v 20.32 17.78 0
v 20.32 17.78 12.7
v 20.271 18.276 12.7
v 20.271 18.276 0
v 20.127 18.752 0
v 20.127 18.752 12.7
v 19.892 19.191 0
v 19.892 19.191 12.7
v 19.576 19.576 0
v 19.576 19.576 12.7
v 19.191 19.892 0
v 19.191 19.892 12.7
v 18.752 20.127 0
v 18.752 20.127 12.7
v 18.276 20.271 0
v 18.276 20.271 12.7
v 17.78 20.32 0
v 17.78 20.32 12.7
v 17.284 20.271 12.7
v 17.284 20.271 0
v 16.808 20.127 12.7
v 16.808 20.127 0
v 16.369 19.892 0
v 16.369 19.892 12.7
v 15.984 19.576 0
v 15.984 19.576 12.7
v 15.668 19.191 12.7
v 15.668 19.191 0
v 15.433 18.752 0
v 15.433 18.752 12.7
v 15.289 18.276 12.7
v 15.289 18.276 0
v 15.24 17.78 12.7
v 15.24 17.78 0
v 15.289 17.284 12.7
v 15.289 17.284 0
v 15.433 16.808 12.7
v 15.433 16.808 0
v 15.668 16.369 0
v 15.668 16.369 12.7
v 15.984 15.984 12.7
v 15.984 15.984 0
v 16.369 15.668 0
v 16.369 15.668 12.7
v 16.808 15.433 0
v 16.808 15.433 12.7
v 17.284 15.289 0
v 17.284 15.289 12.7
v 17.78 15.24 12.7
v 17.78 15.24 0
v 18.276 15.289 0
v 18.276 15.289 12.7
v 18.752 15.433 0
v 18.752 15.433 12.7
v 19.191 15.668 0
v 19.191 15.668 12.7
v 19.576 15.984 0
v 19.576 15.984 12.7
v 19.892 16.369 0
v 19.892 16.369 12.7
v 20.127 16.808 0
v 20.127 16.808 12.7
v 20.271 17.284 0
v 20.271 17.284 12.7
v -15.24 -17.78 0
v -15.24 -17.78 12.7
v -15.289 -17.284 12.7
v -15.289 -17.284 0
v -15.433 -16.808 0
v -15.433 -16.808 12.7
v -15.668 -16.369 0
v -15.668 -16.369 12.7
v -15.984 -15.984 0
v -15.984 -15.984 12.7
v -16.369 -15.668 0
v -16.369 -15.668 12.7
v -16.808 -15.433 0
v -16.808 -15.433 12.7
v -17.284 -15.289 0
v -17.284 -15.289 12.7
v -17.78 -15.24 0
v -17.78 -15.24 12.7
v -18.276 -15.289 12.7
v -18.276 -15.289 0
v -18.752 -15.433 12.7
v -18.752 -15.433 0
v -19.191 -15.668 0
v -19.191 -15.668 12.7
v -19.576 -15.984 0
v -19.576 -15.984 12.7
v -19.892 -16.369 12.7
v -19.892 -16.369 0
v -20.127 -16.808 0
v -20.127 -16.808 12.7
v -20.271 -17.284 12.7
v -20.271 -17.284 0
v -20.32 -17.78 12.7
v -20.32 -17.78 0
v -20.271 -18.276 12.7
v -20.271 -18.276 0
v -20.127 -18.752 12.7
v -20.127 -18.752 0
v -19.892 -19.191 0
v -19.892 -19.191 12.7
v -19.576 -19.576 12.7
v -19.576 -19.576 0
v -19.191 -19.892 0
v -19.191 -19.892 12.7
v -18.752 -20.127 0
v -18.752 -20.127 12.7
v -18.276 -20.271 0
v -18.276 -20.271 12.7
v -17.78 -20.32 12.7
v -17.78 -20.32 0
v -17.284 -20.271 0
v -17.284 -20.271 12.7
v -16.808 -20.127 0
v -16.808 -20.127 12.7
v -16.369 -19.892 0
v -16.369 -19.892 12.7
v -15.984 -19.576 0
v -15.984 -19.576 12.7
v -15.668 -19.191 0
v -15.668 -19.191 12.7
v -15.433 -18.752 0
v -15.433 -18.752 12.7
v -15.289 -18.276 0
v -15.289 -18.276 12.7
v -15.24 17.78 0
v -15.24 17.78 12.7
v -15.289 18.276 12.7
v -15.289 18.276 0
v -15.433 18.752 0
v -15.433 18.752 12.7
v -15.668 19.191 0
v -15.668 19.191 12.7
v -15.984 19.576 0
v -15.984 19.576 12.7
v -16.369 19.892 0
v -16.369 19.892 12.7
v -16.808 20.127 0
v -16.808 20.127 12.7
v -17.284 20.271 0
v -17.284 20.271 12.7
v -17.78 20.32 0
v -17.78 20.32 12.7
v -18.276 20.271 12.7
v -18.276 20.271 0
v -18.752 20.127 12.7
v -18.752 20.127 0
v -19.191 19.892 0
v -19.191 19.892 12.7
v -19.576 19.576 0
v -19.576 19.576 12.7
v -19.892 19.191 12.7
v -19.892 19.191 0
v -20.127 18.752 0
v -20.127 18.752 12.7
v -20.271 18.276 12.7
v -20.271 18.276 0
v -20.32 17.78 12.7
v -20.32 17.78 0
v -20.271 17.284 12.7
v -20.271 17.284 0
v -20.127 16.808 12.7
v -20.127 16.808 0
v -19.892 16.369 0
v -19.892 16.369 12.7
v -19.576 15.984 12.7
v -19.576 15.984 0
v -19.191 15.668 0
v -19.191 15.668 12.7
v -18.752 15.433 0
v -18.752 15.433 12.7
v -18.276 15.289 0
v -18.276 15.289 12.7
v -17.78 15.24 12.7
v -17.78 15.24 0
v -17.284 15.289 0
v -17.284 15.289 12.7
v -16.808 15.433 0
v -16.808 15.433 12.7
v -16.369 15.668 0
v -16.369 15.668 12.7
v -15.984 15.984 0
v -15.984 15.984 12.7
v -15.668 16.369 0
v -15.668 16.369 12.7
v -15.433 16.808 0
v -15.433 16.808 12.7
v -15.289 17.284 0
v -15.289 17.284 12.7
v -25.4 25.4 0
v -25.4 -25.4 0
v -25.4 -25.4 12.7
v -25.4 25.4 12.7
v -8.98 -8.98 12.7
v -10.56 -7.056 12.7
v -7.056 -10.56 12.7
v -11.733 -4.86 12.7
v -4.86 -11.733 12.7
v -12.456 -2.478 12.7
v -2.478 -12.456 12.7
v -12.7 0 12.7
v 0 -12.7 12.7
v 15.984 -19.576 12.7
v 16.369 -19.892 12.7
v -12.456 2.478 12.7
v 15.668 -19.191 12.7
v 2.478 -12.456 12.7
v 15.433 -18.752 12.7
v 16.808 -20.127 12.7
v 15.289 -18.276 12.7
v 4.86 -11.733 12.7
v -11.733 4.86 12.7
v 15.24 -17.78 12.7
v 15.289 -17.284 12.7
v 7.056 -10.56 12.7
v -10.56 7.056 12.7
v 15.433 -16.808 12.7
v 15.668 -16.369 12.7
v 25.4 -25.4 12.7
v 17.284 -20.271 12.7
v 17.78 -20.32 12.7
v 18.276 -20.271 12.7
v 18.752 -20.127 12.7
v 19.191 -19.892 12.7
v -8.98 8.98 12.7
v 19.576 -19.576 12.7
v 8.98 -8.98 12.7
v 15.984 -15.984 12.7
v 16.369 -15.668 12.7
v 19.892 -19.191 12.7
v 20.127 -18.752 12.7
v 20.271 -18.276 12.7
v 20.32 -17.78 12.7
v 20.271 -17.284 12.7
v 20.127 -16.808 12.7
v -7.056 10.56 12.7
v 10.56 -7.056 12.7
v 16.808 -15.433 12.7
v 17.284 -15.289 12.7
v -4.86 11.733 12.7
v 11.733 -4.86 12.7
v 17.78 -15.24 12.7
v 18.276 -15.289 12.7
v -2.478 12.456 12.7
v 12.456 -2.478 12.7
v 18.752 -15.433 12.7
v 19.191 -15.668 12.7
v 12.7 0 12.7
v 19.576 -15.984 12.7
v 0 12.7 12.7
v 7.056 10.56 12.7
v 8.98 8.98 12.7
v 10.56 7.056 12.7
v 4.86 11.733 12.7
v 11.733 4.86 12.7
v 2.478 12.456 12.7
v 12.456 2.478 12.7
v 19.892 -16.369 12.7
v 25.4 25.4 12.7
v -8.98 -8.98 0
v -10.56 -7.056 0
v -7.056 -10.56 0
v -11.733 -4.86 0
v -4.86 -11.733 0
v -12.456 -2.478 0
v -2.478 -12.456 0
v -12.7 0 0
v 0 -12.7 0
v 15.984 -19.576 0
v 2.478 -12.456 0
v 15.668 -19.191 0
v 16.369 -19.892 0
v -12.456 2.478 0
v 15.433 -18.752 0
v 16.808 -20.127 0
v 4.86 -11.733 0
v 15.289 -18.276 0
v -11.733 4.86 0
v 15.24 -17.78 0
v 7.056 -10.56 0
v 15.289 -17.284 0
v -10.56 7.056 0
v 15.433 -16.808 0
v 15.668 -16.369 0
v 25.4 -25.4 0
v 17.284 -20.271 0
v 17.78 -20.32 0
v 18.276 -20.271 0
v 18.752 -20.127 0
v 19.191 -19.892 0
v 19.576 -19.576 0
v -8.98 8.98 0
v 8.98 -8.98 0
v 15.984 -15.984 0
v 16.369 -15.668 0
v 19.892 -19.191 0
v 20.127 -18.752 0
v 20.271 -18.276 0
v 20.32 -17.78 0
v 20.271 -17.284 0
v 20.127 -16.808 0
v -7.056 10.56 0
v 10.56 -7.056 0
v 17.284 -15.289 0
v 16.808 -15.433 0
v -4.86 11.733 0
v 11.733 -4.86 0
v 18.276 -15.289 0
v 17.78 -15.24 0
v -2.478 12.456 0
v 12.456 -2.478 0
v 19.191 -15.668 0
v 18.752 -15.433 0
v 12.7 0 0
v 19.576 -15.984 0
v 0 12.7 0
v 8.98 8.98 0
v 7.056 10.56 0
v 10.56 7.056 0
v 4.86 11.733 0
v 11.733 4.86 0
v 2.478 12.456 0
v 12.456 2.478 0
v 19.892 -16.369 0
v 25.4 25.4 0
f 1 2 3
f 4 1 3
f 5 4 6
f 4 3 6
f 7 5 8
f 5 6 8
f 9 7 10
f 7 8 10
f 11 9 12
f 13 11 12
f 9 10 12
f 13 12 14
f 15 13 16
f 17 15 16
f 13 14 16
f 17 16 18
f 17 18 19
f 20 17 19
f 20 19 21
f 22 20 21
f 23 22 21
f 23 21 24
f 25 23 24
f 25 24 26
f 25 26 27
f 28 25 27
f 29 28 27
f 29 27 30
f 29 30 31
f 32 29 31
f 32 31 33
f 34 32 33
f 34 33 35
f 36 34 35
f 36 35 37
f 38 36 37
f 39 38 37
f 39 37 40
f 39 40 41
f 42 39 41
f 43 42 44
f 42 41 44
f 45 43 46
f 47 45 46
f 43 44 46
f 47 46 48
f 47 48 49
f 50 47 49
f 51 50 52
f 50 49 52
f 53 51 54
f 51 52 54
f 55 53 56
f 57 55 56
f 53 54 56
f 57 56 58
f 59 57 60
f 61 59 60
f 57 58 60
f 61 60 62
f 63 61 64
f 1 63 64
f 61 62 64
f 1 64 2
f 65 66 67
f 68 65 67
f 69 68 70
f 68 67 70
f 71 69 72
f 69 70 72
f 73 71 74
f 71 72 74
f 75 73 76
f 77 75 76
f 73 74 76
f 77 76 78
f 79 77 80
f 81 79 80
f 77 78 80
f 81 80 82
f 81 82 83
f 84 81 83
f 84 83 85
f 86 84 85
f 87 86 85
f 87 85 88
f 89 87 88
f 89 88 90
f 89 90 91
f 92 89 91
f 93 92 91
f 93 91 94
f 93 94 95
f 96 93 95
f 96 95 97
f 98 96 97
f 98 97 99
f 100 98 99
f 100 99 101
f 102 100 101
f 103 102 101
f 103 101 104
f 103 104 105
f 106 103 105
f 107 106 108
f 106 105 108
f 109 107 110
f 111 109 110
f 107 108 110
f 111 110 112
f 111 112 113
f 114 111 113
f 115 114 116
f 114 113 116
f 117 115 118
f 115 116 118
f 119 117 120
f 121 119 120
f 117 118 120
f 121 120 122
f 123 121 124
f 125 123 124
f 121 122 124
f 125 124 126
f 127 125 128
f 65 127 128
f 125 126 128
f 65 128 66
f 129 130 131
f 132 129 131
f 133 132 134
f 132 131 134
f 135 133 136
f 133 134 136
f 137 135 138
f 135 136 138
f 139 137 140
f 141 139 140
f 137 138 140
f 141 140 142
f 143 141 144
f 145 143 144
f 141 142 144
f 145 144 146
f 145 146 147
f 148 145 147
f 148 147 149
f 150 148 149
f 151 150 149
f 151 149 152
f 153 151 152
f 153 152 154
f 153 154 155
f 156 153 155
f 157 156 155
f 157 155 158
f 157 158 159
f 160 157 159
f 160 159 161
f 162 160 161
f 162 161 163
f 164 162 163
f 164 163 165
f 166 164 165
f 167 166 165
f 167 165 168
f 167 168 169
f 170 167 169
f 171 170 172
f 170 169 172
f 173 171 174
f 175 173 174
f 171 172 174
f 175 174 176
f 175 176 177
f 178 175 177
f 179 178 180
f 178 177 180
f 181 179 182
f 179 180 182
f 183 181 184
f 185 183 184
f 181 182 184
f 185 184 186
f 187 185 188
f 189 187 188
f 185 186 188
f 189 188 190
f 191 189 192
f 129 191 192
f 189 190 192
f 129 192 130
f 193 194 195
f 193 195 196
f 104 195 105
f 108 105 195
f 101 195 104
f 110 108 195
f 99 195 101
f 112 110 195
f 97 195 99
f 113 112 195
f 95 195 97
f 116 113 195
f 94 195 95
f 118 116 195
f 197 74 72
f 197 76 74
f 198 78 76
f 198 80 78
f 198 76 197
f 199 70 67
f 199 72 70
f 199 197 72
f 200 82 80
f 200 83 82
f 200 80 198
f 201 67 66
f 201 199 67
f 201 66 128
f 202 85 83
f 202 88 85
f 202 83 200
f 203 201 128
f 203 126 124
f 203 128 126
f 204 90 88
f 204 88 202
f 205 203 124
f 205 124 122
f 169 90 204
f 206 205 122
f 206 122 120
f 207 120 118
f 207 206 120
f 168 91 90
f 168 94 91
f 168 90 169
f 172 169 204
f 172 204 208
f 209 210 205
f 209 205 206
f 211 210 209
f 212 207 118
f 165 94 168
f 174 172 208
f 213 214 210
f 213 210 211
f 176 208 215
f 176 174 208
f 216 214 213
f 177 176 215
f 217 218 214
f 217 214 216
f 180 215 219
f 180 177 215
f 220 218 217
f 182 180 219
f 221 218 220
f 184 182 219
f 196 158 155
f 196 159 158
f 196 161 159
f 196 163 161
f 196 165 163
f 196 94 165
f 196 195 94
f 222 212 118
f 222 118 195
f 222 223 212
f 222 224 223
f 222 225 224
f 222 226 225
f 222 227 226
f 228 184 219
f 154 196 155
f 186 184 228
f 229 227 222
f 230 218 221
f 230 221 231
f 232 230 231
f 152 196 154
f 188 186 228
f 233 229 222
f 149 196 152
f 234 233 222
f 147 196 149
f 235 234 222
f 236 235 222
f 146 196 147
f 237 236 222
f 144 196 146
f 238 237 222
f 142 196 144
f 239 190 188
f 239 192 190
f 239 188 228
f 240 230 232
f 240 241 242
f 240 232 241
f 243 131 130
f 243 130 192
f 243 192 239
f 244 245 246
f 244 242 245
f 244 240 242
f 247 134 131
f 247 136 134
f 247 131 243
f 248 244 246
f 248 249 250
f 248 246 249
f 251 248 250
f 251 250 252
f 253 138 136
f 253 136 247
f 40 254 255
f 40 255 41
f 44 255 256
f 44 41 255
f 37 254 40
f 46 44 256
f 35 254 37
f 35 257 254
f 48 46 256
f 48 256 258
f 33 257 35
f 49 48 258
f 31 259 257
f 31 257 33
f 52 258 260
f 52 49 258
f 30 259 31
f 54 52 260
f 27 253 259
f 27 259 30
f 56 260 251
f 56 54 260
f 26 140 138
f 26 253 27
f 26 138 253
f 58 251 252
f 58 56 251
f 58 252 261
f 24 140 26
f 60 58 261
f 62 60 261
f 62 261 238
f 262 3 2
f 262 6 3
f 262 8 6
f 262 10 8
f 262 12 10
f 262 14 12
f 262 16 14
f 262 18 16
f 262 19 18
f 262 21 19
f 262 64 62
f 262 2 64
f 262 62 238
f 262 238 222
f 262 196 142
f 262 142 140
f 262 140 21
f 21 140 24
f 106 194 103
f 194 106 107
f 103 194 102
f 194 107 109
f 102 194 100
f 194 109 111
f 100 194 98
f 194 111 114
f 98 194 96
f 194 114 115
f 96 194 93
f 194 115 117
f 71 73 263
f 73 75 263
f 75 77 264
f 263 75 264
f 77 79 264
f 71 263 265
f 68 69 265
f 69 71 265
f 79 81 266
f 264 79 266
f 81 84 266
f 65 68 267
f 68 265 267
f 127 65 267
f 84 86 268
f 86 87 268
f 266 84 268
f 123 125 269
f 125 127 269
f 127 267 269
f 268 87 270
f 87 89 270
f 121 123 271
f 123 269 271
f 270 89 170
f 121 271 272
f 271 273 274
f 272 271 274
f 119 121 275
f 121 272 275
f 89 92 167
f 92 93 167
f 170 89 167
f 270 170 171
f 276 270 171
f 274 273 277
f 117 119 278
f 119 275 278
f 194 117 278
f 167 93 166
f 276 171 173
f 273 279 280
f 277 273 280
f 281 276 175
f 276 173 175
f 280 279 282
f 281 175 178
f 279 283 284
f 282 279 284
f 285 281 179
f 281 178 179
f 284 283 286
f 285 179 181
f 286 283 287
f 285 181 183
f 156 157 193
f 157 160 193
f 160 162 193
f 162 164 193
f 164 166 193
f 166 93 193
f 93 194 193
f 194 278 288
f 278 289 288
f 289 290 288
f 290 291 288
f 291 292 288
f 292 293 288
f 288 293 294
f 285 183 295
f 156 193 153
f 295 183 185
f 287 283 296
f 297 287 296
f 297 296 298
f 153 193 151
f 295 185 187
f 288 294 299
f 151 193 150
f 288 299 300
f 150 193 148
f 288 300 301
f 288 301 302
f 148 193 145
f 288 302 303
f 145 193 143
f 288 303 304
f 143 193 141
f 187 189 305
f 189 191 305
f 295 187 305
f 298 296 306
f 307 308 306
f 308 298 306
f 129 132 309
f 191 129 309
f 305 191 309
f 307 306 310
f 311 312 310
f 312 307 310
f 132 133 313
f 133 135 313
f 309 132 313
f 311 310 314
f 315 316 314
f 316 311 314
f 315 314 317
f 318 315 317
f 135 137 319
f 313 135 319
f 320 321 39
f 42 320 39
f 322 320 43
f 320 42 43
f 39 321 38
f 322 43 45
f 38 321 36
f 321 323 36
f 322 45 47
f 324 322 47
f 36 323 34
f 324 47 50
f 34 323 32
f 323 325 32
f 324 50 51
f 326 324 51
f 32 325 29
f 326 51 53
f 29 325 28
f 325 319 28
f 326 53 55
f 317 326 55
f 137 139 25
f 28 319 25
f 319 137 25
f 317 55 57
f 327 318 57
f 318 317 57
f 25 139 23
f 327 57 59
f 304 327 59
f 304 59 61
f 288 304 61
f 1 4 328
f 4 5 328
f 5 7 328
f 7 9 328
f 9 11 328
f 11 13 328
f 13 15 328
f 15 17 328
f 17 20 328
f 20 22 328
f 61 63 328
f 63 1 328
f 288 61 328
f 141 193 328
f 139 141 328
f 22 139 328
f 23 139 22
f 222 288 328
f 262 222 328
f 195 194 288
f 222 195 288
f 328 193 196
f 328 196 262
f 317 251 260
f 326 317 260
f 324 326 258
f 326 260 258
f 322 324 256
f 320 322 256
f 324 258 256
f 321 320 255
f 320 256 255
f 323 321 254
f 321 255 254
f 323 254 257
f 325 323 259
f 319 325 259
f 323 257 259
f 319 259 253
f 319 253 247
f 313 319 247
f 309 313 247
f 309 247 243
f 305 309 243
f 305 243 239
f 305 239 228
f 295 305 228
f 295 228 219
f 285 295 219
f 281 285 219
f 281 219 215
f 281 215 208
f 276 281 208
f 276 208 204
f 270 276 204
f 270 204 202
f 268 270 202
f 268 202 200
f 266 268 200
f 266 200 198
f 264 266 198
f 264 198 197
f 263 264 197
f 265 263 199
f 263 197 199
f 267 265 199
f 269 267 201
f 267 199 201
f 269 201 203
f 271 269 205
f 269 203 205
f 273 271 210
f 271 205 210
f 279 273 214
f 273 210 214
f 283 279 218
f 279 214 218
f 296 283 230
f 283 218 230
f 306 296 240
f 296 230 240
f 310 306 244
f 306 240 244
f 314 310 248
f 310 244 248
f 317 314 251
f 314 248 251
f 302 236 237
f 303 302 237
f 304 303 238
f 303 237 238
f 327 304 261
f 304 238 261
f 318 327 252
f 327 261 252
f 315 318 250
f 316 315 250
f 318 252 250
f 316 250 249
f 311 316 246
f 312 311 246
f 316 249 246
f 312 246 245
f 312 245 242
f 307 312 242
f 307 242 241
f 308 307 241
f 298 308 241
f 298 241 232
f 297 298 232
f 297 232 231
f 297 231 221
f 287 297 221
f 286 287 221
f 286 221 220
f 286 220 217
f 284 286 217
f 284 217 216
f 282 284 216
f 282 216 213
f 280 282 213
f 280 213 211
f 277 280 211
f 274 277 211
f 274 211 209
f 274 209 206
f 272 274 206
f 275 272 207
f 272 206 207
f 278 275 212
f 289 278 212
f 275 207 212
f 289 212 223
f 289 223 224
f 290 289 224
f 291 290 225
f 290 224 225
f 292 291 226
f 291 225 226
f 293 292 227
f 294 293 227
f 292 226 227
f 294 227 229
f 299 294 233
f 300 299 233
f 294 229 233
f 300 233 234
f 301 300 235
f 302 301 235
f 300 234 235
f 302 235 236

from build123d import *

# Parameters (mm, degrees)
F0_W     = 50.8
F0_H     = 50.8
F1_DEPTH = 12.7
F2_R     = 2.54
F2_R_2   = 12.7
F3_DEPTH = 25.146


with BuildPart() as f1:
    # F0 (on Top) → F1 (new body)
    with BuildSketch(Plane.XY):
        Rectangle(F0_W, F0_H)
    extrude(amount=F1_DEPTH)

    # F2 (on face) → F3 (cut)
    with BuildSketch(Plane.XY.offset(12.7)):
        with Locations((17.78, 17.78)):
            Circle(F2_R)
        with Locations((17.78, -17.78)):
            Circle(F2_R)
        with Locations((-17.78, 17.78)):
            Circle(F2_R)
        with Locations((-17.78, -17.78)):
            Circle(F2_R)
        Circle(F2_R_2)
    extrude(amount=-F3_DEPTH, mode=Mode.SUBTRACT)


solid = f1.part
